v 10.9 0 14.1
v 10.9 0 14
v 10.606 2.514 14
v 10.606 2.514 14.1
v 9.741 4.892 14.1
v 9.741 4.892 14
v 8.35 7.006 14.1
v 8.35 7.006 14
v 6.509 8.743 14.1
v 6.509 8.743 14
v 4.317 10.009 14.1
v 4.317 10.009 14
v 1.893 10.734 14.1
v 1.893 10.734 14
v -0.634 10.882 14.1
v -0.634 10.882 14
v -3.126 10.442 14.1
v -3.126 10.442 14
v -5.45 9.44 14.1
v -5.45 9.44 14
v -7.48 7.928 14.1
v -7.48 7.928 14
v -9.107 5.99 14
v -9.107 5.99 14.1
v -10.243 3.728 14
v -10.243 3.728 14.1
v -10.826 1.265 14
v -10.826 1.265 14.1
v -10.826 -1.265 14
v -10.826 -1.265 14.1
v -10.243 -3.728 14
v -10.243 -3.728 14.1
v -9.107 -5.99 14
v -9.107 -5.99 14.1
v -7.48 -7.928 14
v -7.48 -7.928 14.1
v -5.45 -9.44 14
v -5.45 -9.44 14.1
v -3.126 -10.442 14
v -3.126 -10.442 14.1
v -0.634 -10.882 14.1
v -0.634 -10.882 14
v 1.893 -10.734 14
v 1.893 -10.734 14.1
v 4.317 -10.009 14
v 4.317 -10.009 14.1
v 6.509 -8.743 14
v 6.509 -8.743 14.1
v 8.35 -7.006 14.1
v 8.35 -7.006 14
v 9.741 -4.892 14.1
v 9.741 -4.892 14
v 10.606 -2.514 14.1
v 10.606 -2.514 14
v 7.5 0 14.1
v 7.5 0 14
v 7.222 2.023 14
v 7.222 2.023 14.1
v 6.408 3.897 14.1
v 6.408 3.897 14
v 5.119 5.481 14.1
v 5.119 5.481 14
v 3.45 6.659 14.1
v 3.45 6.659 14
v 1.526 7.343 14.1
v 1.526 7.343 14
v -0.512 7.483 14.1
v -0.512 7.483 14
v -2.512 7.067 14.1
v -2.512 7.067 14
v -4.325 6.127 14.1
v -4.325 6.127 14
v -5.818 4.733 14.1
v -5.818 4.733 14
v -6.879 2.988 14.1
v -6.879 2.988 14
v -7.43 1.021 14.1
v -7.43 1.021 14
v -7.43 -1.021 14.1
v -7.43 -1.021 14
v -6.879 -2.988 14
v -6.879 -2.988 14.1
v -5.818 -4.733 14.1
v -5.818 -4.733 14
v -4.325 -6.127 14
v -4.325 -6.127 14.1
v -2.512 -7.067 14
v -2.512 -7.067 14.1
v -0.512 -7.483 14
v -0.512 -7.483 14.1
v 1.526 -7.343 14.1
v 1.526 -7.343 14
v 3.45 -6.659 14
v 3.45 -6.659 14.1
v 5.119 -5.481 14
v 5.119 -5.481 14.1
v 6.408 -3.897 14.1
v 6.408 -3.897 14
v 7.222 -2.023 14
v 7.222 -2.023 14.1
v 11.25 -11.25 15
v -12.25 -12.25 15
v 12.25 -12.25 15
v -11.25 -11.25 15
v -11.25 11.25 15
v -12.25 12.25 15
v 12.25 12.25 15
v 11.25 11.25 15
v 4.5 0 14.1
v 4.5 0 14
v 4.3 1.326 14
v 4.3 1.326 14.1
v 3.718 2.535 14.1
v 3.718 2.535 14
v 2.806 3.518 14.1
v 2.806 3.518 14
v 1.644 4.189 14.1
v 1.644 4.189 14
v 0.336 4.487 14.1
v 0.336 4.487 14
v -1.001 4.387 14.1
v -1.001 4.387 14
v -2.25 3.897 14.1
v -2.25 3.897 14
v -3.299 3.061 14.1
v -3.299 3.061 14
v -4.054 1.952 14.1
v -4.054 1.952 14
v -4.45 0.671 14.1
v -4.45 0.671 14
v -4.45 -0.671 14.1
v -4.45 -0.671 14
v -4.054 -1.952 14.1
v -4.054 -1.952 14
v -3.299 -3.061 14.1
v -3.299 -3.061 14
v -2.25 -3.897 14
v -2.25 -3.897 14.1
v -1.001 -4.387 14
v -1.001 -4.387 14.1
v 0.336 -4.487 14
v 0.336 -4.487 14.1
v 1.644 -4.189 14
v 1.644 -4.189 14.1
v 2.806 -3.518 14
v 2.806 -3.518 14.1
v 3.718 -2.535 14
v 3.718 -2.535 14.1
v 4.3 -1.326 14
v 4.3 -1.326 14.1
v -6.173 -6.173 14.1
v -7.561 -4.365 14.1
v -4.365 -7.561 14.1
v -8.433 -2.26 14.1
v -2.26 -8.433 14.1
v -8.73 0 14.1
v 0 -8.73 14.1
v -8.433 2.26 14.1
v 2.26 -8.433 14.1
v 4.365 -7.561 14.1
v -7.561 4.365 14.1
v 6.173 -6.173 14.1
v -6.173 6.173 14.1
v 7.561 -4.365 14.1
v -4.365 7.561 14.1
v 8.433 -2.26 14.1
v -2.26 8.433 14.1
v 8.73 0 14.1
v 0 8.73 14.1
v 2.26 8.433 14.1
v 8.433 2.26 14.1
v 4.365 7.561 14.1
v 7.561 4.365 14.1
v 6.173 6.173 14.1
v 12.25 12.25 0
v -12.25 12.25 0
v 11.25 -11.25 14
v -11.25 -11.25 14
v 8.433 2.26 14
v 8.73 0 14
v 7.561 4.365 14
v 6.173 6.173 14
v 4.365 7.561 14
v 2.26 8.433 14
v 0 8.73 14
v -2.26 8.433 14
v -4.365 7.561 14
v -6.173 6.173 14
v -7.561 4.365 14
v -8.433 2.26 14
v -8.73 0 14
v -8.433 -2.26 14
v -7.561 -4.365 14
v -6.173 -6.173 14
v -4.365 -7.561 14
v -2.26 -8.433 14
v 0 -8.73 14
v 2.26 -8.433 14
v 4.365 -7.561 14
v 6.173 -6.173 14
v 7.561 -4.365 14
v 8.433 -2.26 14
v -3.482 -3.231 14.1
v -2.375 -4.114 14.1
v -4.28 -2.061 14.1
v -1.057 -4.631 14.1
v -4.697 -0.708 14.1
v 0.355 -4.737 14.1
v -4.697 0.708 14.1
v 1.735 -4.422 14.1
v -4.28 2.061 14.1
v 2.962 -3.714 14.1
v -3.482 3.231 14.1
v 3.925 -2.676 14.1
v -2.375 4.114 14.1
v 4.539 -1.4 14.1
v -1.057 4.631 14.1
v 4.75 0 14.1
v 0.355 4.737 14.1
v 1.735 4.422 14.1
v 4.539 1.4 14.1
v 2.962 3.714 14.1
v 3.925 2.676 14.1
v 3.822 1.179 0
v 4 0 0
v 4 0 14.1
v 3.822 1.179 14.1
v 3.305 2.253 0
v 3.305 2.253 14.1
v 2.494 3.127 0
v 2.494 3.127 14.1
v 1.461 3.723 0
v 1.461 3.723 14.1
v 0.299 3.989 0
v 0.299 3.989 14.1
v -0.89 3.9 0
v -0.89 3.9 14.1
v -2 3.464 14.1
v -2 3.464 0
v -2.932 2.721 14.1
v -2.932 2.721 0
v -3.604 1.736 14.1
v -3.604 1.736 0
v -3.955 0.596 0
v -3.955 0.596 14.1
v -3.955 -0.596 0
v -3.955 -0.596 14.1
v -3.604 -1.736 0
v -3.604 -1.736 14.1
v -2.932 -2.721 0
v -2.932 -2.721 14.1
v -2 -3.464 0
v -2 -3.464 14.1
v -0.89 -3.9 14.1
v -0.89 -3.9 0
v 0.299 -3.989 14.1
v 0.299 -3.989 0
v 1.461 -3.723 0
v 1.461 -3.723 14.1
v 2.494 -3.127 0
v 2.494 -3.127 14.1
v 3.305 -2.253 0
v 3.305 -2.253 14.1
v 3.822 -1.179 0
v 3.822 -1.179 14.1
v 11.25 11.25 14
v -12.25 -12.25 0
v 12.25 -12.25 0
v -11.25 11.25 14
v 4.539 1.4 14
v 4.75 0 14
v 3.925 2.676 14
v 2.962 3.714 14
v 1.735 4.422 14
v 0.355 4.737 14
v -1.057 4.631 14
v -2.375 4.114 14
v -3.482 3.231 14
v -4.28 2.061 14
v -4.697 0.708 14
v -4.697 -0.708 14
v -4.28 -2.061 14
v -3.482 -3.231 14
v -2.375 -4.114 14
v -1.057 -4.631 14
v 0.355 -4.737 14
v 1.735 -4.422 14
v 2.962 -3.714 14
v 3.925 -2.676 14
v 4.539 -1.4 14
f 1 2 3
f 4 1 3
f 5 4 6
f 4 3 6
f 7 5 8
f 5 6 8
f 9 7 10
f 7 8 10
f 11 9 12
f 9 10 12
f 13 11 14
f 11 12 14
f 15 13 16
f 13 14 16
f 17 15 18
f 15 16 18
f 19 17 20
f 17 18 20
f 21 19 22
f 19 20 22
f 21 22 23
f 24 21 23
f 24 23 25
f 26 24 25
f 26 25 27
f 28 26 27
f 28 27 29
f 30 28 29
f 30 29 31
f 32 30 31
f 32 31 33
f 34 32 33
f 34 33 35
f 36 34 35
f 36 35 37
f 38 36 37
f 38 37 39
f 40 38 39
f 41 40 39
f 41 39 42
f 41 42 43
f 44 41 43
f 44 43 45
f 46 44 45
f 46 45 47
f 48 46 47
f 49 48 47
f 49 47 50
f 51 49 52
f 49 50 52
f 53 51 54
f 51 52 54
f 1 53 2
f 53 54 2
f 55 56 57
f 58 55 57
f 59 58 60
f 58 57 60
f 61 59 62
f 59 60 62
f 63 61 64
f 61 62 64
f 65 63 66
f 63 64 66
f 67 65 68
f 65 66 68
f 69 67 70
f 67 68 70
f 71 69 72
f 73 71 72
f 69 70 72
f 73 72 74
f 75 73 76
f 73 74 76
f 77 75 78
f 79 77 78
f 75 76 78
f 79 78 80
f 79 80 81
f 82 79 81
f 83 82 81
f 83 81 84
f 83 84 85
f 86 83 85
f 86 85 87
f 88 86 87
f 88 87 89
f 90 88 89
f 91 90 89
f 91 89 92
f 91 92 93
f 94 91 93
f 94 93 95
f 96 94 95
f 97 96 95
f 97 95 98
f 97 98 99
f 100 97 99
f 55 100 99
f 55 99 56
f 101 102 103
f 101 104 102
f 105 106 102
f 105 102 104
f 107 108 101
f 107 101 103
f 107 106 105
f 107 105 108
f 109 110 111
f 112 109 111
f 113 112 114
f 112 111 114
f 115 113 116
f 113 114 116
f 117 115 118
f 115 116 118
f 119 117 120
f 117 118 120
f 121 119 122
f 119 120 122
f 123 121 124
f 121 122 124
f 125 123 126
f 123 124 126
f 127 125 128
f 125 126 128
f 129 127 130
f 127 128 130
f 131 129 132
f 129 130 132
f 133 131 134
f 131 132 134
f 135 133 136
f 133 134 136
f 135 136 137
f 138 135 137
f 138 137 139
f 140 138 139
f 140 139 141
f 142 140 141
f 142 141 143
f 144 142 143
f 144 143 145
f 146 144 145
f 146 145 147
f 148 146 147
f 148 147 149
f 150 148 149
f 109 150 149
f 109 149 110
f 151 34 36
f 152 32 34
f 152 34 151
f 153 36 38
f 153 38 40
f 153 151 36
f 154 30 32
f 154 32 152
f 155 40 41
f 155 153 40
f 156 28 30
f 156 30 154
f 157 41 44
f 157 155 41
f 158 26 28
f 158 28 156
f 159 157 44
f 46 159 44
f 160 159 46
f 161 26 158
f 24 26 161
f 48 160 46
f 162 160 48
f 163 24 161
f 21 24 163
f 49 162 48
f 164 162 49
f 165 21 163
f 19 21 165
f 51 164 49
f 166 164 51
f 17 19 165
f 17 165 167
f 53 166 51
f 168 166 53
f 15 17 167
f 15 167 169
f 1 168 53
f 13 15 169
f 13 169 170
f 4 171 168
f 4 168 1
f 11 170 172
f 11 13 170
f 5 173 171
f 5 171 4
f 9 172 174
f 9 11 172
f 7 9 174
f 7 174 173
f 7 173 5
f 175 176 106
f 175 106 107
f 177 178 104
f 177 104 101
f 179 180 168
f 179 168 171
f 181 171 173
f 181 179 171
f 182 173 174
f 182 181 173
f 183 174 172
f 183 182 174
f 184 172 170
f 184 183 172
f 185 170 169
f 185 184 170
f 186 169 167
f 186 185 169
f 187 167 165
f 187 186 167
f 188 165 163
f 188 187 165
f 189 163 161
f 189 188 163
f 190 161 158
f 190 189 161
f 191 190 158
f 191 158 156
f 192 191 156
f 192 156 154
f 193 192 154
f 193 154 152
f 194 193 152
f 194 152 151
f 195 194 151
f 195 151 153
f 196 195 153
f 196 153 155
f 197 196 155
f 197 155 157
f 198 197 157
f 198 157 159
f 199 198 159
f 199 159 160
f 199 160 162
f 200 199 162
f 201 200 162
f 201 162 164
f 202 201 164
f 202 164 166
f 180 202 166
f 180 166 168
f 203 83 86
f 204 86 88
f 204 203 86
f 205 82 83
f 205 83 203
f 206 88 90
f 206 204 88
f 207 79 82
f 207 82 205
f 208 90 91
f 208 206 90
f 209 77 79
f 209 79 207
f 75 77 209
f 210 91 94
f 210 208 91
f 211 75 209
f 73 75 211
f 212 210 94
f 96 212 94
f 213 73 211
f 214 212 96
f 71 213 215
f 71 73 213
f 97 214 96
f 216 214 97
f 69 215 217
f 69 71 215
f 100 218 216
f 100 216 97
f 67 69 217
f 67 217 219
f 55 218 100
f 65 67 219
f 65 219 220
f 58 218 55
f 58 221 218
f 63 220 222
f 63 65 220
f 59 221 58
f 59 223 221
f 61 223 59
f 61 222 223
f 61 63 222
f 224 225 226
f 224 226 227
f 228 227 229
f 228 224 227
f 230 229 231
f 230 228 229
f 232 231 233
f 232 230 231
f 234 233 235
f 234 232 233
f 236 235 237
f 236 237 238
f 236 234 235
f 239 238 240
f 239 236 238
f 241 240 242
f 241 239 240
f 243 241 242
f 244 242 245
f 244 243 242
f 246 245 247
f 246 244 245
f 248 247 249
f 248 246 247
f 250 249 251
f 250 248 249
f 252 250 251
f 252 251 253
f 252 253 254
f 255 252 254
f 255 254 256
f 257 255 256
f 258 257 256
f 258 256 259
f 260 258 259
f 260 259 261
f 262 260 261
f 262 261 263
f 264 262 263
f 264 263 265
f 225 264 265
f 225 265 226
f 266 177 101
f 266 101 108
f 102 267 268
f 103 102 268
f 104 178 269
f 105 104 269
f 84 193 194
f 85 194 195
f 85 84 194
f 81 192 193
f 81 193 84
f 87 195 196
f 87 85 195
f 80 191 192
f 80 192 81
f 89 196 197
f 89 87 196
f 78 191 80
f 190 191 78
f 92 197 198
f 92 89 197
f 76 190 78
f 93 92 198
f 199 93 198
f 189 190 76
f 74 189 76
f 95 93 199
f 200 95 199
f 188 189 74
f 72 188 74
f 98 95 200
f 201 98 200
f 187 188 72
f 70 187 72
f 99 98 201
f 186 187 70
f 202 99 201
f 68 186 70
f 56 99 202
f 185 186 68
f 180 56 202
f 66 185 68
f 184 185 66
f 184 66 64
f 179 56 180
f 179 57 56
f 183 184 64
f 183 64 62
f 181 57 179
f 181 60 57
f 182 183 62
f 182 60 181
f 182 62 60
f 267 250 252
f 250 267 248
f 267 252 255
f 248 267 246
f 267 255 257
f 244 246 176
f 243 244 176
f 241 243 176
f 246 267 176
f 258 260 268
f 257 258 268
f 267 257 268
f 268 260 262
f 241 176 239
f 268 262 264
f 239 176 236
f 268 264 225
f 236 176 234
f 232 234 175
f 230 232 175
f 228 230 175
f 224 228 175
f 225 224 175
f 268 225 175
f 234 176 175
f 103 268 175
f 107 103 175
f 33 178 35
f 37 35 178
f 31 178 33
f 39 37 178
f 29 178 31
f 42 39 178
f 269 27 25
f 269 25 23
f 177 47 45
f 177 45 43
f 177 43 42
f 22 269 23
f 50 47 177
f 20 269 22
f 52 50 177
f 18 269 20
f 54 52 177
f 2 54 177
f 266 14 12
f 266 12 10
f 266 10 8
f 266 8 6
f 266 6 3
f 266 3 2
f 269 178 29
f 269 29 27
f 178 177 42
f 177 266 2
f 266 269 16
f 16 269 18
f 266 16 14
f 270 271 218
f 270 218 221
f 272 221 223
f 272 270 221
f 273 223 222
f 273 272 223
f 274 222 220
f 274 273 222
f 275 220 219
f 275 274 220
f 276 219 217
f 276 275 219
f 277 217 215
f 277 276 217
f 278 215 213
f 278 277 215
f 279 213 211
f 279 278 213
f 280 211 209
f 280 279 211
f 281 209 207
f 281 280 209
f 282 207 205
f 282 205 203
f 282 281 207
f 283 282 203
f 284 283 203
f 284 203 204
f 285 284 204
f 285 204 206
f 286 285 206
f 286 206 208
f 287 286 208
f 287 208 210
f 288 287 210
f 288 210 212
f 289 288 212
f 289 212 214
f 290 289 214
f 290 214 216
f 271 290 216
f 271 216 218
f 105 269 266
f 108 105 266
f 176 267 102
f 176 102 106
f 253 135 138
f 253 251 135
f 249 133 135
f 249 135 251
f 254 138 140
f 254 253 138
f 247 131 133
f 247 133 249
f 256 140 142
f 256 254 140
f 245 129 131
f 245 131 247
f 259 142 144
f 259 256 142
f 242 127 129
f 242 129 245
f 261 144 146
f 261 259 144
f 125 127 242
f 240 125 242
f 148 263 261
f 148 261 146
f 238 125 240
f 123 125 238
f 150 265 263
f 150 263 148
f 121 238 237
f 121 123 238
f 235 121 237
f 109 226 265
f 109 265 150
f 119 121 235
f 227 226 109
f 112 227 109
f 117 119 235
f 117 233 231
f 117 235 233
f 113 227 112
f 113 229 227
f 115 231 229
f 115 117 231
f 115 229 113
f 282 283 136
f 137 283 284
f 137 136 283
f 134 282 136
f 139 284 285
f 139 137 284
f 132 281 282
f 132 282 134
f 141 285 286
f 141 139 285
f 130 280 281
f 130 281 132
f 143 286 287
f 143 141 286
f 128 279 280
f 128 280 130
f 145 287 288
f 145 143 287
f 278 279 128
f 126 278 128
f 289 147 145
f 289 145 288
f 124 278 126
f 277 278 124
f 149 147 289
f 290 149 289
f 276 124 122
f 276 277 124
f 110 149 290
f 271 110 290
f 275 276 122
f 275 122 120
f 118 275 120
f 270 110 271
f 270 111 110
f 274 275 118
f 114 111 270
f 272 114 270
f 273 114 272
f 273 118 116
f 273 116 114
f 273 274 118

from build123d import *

# Parameters (mm, degrees)
SKETCH2_W                = 24.5
SKETCH2_H                = 24.5
SKETCH2_W_2              = 22.5
SKETCH2_H_2              = 22.5
BOSS_EXTRUDE1_DEPTH      = 15
SKETCH3_W                = 22.5
SKETCH3_H                = 22.5
BOSS_EXTRUDE2_DEPTH      = 14
BOSS_EXTRUDE4_DEPTH      = 0.1
BOSS_EXTRUDE4_DEPTH_BACK = 6.9
SKETCH4_R                = 10.9
SKETCH4_R_2              = 8.730342775
SKETCH4_R_3              = 7.5
SKETCH4_R_4              = 4.75
SKETCH4_R_5              = 4.5
SKETCH4_R_6              = 4
CUT_EXTRUDE1_START       = -15
SKETCH6_R                = 4
CUT_EXTRUDE1_DEPTH       = 15


with BuildPart() as part:
    # Sketch2 → Boss-Extrude1 (new body)
    with BuildSketch(Plane.XY):
        Rectangle(SKETCH2_W, SKETCH2_H)
        Rectangle(SKETCH2_W_2, SKETCH2_H_2, mode=Mode.SUBTRACT)
    extrude(amount=BOSS_EXTRUDE1_DEPTH)

    # Sketch3 → Boss-Extrude2 (add)
    with BuildSketch(Plane.XY):
        Rectangle(SKETCH3_W, SKETCH3_H)
    extrude(amount=BOSS_EXTRUDE2_DEPTH)

    # Sketch4 → Boss-Extrude4 (add, two sides: drawn at the far end of the back side and taken through both)
    # profile 1 of 3: a face of its own
    with BuildSketch(Plane.XY.offset(14).offset(-BOSS_EXTRUDE4_DEPTH_BACK)):
        Circle(SKETCH4_R)
        Circle(SKETCH4_R_2, mode=Mode.SUBTRACT)
    # profile 2 of 3: a face of its own
    with BuildSketch(Plane.XY.offset(14).offset(-BOSS_EXTRUDE4_DEPTH_BACK)):
        Circle(SKETCH4_R_3)
        Circle(SKETCH4_R_4, mode=Mode.SUBTRACT)
    # profile 3 of 3: a face of its own
    with BuildSketch(Plane.XY.offset(14).offset(-BOSS_EXTRUDE4_DEPTH_BACK)):
        Circle(SKETCH4_R_5)
        Circle(SKETCH4_R_6, mode=Mode.SUBTRACT)
    extrude(amount=BOSS_EXTRUDE4_DEPTH + BOSS_EXTRUDE4_DEPTH_BACK)

    # Sketch6 → Cut-Extrude1 (cut)
    with BuildSketch(Plane.XY.offset(14).offset(CUT_EXTRUDE1_START)):
        Circle(SKETCH6_R)
    extrude(amount=CUT_EXTRUDE1_DEPTH, mode=Mode.SUBTRACT)


solid = part.part
